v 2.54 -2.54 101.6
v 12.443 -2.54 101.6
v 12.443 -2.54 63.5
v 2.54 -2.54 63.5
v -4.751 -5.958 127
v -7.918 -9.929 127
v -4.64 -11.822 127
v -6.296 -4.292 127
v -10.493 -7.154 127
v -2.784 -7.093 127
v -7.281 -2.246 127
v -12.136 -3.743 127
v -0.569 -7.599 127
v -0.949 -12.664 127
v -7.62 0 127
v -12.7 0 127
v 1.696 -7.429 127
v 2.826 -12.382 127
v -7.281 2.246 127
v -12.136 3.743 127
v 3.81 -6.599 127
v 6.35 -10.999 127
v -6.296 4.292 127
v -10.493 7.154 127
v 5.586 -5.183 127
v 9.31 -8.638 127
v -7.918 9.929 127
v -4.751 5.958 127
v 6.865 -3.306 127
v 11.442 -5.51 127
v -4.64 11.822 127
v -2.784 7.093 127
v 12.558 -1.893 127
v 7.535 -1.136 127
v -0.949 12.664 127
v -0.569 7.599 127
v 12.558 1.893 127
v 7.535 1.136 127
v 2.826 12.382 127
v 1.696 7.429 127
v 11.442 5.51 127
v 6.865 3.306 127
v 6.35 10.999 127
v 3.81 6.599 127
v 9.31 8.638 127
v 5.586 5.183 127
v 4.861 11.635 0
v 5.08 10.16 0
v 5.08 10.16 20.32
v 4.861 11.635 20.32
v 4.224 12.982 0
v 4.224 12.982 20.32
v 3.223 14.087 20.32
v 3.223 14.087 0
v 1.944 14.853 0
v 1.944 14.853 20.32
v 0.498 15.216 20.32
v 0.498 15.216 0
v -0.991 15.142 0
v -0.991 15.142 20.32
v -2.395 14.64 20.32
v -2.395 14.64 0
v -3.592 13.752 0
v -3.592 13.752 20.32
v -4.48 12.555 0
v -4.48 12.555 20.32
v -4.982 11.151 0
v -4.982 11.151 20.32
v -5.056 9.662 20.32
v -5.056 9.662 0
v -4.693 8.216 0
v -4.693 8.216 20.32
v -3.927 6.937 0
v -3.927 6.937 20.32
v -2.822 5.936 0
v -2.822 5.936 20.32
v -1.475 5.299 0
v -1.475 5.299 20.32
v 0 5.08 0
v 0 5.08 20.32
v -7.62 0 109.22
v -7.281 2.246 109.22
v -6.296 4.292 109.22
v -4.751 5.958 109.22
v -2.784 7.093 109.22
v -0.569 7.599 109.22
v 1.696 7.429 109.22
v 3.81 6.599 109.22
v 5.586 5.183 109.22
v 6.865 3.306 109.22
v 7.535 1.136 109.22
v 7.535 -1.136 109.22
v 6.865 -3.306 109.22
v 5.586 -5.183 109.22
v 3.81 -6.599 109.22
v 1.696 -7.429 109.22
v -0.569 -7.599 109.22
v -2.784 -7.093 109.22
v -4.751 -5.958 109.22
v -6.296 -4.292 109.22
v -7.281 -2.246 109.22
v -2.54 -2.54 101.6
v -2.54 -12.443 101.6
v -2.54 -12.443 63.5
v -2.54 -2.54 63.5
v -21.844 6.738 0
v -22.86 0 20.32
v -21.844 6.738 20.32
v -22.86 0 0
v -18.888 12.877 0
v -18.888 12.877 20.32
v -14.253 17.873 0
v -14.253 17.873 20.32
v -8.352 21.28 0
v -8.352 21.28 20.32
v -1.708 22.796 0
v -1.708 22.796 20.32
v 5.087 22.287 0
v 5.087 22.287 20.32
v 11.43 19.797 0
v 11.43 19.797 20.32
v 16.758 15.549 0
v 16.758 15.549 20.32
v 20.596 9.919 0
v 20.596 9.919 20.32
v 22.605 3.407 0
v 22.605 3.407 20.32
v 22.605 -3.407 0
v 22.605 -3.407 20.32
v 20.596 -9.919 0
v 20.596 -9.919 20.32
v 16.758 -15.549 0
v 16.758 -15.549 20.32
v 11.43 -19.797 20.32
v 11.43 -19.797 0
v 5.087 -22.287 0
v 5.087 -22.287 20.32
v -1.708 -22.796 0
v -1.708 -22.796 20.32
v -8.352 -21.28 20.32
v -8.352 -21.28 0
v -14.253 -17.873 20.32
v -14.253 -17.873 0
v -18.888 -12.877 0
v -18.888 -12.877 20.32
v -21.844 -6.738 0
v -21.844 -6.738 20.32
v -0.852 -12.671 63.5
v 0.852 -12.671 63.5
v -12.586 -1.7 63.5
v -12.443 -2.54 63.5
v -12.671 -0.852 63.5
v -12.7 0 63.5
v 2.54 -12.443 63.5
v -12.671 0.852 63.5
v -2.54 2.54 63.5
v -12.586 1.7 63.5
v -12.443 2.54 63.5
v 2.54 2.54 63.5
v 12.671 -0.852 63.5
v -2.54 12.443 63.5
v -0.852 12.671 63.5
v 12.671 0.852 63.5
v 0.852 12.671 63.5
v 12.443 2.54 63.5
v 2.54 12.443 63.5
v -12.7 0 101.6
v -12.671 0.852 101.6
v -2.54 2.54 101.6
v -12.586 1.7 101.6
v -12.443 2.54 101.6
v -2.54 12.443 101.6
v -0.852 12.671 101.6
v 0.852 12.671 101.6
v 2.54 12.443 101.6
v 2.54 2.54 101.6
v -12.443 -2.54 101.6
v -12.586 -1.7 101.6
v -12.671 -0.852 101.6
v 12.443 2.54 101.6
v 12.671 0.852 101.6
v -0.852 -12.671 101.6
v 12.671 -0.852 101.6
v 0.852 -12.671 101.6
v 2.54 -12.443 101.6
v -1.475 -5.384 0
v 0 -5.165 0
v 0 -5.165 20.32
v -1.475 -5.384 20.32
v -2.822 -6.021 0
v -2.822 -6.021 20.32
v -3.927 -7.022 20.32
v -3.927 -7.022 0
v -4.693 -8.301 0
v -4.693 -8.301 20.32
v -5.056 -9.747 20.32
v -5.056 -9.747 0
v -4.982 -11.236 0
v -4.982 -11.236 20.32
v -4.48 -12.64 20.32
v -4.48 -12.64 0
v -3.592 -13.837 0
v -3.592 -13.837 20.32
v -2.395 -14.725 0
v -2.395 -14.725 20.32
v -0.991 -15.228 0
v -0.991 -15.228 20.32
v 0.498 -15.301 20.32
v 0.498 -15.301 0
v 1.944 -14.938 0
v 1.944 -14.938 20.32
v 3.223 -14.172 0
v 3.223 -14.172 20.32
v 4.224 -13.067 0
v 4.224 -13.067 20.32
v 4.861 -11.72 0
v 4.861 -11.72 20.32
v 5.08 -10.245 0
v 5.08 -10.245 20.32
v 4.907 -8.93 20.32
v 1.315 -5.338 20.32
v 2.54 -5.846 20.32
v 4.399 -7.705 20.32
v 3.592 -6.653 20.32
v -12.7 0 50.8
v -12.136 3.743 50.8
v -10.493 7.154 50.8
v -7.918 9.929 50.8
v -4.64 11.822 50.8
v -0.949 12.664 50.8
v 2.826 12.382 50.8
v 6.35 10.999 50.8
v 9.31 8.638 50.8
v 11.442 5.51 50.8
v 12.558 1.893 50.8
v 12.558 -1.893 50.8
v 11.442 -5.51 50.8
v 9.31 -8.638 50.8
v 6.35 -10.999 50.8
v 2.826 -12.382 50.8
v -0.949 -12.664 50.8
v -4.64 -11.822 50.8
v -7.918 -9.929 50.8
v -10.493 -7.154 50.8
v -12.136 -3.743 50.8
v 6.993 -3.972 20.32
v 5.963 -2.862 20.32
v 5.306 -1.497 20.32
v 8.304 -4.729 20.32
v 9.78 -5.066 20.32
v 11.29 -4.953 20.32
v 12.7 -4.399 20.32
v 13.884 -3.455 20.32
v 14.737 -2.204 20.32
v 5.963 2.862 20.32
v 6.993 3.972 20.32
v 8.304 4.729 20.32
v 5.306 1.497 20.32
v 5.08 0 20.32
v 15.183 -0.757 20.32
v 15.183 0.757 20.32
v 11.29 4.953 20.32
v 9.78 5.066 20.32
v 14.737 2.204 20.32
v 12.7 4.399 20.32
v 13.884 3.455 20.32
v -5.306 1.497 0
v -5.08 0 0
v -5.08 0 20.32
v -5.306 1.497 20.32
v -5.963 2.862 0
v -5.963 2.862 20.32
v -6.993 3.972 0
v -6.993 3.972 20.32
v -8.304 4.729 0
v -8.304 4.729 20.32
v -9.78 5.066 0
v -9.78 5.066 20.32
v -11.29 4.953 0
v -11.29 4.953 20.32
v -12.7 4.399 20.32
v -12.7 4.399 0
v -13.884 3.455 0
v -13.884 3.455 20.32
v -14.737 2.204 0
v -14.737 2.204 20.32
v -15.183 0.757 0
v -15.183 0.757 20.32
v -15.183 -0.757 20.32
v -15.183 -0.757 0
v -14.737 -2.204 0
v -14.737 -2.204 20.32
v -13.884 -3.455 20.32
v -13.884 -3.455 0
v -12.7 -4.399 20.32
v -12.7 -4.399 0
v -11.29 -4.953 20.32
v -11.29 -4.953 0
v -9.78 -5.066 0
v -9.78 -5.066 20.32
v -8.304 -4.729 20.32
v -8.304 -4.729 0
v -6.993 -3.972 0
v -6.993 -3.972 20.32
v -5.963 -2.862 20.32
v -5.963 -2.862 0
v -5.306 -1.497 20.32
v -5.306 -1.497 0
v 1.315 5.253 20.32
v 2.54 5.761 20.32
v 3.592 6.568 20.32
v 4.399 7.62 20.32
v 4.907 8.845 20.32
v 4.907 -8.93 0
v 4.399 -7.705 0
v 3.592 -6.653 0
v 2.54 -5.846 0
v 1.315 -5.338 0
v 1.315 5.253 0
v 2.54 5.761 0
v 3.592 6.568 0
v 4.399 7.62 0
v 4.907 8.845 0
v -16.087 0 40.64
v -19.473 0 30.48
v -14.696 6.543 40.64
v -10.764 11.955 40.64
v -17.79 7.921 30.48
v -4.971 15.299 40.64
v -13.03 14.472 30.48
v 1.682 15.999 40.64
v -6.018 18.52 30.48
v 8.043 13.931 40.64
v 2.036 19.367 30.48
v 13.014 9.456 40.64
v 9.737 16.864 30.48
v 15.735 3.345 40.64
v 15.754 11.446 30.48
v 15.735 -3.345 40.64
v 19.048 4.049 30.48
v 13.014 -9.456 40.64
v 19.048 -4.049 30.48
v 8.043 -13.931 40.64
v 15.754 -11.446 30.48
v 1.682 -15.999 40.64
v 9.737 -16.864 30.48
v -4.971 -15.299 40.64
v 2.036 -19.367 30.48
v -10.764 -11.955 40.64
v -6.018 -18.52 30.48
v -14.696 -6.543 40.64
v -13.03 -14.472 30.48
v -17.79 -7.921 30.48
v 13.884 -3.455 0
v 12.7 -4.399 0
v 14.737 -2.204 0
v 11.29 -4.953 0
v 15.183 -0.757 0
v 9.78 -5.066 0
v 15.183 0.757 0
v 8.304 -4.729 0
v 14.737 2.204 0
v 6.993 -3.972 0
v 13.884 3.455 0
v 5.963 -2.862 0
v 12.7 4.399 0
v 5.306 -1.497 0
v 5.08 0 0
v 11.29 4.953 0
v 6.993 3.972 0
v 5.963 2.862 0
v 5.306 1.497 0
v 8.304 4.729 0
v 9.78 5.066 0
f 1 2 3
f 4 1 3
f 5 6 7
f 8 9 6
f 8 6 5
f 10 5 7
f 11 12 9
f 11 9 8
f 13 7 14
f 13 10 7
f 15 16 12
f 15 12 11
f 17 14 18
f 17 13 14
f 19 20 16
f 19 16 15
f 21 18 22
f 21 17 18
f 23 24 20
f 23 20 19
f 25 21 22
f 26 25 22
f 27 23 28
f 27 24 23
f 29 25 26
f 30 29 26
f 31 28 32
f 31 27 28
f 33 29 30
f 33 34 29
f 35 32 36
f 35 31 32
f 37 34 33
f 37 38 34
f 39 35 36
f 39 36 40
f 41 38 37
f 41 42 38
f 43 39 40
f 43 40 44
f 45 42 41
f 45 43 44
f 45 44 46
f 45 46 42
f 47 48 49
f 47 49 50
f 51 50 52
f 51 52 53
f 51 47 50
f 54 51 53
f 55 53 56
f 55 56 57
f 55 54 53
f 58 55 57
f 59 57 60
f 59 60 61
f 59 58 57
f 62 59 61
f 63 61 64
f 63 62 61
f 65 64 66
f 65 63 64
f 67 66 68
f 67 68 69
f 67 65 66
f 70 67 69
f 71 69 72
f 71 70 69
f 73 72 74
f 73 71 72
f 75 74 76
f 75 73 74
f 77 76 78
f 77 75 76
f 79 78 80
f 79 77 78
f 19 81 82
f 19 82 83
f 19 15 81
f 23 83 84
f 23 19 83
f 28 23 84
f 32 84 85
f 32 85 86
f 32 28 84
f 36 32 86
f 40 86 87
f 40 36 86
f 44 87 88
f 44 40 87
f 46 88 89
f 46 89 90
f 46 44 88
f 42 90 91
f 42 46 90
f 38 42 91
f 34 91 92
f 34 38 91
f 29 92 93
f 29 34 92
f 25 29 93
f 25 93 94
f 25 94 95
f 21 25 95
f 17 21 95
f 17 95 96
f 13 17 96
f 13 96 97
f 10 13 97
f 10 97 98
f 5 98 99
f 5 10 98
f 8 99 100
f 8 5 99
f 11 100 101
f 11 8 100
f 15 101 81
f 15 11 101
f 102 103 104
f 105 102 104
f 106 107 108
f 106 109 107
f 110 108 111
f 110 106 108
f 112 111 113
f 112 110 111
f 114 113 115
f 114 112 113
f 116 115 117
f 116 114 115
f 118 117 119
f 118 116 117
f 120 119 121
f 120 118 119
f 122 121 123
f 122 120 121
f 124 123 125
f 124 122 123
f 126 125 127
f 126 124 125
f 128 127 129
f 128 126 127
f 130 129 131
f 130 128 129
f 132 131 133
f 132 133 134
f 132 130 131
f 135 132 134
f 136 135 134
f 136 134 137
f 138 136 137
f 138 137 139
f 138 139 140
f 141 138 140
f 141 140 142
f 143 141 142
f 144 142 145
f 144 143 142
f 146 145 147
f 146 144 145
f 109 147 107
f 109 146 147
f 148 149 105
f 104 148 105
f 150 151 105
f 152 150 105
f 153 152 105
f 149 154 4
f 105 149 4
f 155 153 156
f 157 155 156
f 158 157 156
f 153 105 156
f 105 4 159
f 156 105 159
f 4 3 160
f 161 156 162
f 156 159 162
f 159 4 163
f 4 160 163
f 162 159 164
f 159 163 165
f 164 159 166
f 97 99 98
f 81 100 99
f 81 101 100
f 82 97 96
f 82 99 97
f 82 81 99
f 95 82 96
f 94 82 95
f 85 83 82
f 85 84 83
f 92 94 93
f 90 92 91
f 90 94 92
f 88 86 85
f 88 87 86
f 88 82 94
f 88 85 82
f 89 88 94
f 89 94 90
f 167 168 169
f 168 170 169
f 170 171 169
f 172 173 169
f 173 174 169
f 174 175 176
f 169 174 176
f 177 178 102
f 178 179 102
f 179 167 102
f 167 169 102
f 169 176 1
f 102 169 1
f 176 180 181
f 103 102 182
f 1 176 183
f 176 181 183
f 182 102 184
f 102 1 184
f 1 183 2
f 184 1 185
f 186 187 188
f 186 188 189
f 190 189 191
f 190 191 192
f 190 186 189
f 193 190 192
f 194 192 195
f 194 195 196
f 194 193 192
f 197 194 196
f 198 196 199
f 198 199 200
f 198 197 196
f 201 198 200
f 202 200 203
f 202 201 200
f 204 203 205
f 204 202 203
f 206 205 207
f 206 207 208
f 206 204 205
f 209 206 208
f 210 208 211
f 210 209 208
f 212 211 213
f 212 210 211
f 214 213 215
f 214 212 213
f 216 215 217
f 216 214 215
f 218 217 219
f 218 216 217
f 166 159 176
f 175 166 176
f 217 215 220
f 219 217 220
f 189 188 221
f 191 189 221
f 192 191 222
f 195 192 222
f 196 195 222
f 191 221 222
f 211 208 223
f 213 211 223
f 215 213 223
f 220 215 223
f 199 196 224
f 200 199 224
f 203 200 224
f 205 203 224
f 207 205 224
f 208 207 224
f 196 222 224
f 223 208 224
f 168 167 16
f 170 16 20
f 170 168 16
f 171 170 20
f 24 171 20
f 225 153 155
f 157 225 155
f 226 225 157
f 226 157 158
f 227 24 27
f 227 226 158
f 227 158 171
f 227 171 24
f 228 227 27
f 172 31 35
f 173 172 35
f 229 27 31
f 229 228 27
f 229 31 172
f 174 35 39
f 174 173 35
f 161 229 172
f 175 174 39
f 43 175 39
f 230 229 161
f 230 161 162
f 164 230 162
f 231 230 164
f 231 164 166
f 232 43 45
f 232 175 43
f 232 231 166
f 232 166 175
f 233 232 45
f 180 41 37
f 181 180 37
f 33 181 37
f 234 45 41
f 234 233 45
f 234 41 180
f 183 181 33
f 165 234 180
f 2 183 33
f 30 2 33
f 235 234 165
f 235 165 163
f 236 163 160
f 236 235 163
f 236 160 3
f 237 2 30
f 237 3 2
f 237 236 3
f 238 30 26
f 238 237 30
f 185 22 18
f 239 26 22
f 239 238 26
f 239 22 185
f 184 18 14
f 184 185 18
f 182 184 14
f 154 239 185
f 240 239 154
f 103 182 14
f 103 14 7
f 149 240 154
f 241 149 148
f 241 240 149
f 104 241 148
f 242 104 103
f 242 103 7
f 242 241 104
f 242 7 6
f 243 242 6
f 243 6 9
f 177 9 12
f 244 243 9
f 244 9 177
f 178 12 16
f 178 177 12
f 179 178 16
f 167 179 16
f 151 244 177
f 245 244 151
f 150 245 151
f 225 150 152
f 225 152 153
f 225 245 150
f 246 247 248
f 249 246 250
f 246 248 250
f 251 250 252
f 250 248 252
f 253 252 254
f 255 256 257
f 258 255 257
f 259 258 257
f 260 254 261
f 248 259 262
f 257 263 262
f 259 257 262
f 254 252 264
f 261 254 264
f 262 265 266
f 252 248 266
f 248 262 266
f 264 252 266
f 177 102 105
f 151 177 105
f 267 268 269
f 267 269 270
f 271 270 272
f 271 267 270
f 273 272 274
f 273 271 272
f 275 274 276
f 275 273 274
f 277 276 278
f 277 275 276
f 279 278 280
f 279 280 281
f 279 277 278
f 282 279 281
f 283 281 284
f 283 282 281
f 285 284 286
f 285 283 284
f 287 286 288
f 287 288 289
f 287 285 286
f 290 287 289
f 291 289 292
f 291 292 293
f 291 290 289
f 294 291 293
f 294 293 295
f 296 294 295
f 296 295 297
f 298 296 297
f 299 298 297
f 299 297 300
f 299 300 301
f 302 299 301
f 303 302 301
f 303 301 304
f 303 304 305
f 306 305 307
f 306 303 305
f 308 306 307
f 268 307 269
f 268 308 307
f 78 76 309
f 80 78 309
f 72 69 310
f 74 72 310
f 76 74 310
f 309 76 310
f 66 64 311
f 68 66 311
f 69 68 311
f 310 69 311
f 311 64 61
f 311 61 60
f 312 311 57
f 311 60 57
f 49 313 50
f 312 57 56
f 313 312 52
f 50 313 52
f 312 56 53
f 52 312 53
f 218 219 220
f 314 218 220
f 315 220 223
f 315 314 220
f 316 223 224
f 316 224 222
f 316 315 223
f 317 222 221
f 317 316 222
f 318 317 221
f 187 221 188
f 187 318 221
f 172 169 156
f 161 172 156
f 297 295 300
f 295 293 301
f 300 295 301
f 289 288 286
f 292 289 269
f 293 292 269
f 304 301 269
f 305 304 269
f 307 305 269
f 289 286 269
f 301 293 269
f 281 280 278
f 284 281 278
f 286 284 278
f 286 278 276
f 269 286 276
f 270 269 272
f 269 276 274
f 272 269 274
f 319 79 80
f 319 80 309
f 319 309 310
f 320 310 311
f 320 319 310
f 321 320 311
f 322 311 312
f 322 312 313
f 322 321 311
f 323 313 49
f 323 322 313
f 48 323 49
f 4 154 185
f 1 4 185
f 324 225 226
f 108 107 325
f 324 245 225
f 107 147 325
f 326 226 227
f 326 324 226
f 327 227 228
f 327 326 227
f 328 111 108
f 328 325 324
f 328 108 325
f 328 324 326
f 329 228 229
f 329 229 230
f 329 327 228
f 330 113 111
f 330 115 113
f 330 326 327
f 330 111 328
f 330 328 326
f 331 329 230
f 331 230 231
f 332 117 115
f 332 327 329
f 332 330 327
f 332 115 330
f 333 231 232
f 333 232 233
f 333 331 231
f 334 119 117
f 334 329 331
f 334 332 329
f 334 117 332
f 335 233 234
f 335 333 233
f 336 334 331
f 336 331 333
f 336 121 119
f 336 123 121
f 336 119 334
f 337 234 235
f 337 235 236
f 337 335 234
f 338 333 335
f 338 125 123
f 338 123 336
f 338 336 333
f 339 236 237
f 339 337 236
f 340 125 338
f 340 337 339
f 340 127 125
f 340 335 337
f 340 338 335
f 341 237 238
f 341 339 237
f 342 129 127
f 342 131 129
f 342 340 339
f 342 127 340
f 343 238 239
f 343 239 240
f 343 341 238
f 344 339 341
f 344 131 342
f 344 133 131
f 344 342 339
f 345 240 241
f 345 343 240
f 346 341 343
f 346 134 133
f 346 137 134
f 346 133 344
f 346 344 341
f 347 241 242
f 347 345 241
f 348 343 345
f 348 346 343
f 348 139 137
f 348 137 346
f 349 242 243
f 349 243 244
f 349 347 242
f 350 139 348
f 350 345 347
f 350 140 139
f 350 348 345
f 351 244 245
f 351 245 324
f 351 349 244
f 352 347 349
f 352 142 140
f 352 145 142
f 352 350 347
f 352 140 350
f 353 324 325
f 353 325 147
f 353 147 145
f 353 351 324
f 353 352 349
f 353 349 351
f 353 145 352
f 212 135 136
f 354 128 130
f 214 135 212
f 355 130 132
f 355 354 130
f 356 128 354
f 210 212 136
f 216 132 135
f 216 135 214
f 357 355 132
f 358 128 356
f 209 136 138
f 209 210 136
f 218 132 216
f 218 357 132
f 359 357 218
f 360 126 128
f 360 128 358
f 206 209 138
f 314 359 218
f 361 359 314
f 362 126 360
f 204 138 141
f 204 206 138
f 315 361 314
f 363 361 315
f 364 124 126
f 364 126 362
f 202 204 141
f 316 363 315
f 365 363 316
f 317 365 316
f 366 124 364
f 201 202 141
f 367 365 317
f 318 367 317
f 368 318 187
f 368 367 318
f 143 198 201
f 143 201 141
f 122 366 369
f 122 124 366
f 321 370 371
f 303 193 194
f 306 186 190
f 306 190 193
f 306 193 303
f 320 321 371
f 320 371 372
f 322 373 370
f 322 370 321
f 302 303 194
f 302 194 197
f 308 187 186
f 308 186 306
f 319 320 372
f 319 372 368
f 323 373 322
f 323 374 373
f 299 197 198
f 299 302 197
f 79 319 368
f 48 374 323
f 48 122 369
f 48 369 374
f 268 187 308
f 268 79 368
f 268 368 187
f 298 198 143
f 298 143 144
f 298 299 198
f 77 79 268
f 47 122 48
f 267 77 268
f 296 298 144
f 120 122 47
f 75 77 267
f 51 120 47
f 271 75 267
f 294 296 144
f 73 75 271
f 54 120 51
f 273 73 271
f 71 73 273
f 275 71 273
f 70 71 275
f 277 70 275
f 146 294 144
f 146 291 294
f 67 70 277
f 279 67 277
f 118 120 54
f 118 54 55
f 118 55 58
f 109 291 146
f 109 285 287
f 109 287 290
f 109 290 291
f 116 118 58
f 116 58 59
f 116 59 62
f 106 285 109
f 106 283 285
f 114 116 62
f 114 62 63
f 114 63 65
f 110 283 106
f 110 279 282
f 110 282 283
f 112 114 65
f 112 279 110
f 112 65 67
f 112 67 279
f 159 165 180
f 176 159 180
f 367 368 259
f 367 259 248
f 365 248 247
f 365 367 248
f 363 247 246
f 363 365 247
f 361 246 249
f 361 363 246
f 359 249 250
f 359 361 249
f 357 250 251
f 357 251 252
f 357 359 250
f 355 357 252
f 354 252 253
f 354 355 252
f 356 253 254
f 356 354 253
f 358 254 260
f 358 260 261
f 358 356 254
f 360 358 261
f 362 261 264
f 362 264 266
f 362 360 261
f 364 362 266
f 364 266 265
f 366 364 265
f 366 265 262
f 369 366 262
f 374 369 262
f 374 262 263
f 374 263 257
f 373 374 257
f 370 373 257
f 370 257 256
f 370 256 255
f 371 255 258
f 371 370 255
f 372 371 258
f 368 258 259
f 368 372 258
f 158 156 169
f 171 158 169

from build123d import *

# Parameters (mm, degrees)
F2_R     = 5.08
F3_DEPTH = 20.32
F5_DEPTH = 15.24
F7_DEPTH = 15.24


with BuildPart() as f1:
    # F0 (on Front) → F1 (revolve)
    with BuildSketch(Plane.XZ):
        Polygon((-22.86, 0), (0, 0), (0, 50.8), (0, 63.5), (0, 109.22), (-7.62, 109.22), (-7.62, 127), (-12.7, 127), (-12.7, 63.5), (-12.7, 50.8), (-22.86, 20.32), align=None)
    revolve(axis=Axis((0, 0, 86.36), (0, 0, -1)))

    # F2 (on Top) → F3 (cut)
    with BuildSketch(Plane.XY):
        with BuildLine():
            ThreePointArc((5.08, 10.16), (-3.592102, 13.752102), (0, 5.08))
            ThreePointArc((0, 5.08), (3.592102, 6.567898), (5.08, 10.16))
        make_face()
        with BuildLine():
            ThreePointArc((15.24, 0), (10.16, 5.08), (5.08, 0))
            ThreePointArc((5.08, 0), (10.16, -5.08), (15.24, 0))
        make_face()
        with BuildLine():
            ThreePointArc((5.08, -10.245183), (3.592102, -6.65308), (0, -5.165183))
            ThreePointArc((0, -5.165183), (-3.592102, -13.837285), (5.08, -10.245183))
        make_face()
        with Locations((-10.16, 0)):
            Circle(F2_R)
    extrude(amount=F3_DEPTH, mode=Mode.SUBTRACT)

    # F4 (on Right) → F5 (cut, symmetric)
    with BuildSketch(Plane.YZ):
        Polygon((-2.54, 63.5), (0, 63.5), (2.54, 63.5), (2.54, 101.6), (-2.54, 101.6), align=None)
    extrude(amount=F5_DEPTH, both=True, mode=Mode.SUBTRACT)

    # F6 (on Front) → F7 (cut, symmetric)
    with BuildSketch(Plane.XZ):
        Polygon((-2.54, 63.5), (0, 63.5), (2.54, 63.5), (2.54, 101.6), (-2.54, 101.6), align=None)
    extrude(amount=F7_DEPTH, both=True, mode=Mode.SUBTRACT)


solid = f1.part
